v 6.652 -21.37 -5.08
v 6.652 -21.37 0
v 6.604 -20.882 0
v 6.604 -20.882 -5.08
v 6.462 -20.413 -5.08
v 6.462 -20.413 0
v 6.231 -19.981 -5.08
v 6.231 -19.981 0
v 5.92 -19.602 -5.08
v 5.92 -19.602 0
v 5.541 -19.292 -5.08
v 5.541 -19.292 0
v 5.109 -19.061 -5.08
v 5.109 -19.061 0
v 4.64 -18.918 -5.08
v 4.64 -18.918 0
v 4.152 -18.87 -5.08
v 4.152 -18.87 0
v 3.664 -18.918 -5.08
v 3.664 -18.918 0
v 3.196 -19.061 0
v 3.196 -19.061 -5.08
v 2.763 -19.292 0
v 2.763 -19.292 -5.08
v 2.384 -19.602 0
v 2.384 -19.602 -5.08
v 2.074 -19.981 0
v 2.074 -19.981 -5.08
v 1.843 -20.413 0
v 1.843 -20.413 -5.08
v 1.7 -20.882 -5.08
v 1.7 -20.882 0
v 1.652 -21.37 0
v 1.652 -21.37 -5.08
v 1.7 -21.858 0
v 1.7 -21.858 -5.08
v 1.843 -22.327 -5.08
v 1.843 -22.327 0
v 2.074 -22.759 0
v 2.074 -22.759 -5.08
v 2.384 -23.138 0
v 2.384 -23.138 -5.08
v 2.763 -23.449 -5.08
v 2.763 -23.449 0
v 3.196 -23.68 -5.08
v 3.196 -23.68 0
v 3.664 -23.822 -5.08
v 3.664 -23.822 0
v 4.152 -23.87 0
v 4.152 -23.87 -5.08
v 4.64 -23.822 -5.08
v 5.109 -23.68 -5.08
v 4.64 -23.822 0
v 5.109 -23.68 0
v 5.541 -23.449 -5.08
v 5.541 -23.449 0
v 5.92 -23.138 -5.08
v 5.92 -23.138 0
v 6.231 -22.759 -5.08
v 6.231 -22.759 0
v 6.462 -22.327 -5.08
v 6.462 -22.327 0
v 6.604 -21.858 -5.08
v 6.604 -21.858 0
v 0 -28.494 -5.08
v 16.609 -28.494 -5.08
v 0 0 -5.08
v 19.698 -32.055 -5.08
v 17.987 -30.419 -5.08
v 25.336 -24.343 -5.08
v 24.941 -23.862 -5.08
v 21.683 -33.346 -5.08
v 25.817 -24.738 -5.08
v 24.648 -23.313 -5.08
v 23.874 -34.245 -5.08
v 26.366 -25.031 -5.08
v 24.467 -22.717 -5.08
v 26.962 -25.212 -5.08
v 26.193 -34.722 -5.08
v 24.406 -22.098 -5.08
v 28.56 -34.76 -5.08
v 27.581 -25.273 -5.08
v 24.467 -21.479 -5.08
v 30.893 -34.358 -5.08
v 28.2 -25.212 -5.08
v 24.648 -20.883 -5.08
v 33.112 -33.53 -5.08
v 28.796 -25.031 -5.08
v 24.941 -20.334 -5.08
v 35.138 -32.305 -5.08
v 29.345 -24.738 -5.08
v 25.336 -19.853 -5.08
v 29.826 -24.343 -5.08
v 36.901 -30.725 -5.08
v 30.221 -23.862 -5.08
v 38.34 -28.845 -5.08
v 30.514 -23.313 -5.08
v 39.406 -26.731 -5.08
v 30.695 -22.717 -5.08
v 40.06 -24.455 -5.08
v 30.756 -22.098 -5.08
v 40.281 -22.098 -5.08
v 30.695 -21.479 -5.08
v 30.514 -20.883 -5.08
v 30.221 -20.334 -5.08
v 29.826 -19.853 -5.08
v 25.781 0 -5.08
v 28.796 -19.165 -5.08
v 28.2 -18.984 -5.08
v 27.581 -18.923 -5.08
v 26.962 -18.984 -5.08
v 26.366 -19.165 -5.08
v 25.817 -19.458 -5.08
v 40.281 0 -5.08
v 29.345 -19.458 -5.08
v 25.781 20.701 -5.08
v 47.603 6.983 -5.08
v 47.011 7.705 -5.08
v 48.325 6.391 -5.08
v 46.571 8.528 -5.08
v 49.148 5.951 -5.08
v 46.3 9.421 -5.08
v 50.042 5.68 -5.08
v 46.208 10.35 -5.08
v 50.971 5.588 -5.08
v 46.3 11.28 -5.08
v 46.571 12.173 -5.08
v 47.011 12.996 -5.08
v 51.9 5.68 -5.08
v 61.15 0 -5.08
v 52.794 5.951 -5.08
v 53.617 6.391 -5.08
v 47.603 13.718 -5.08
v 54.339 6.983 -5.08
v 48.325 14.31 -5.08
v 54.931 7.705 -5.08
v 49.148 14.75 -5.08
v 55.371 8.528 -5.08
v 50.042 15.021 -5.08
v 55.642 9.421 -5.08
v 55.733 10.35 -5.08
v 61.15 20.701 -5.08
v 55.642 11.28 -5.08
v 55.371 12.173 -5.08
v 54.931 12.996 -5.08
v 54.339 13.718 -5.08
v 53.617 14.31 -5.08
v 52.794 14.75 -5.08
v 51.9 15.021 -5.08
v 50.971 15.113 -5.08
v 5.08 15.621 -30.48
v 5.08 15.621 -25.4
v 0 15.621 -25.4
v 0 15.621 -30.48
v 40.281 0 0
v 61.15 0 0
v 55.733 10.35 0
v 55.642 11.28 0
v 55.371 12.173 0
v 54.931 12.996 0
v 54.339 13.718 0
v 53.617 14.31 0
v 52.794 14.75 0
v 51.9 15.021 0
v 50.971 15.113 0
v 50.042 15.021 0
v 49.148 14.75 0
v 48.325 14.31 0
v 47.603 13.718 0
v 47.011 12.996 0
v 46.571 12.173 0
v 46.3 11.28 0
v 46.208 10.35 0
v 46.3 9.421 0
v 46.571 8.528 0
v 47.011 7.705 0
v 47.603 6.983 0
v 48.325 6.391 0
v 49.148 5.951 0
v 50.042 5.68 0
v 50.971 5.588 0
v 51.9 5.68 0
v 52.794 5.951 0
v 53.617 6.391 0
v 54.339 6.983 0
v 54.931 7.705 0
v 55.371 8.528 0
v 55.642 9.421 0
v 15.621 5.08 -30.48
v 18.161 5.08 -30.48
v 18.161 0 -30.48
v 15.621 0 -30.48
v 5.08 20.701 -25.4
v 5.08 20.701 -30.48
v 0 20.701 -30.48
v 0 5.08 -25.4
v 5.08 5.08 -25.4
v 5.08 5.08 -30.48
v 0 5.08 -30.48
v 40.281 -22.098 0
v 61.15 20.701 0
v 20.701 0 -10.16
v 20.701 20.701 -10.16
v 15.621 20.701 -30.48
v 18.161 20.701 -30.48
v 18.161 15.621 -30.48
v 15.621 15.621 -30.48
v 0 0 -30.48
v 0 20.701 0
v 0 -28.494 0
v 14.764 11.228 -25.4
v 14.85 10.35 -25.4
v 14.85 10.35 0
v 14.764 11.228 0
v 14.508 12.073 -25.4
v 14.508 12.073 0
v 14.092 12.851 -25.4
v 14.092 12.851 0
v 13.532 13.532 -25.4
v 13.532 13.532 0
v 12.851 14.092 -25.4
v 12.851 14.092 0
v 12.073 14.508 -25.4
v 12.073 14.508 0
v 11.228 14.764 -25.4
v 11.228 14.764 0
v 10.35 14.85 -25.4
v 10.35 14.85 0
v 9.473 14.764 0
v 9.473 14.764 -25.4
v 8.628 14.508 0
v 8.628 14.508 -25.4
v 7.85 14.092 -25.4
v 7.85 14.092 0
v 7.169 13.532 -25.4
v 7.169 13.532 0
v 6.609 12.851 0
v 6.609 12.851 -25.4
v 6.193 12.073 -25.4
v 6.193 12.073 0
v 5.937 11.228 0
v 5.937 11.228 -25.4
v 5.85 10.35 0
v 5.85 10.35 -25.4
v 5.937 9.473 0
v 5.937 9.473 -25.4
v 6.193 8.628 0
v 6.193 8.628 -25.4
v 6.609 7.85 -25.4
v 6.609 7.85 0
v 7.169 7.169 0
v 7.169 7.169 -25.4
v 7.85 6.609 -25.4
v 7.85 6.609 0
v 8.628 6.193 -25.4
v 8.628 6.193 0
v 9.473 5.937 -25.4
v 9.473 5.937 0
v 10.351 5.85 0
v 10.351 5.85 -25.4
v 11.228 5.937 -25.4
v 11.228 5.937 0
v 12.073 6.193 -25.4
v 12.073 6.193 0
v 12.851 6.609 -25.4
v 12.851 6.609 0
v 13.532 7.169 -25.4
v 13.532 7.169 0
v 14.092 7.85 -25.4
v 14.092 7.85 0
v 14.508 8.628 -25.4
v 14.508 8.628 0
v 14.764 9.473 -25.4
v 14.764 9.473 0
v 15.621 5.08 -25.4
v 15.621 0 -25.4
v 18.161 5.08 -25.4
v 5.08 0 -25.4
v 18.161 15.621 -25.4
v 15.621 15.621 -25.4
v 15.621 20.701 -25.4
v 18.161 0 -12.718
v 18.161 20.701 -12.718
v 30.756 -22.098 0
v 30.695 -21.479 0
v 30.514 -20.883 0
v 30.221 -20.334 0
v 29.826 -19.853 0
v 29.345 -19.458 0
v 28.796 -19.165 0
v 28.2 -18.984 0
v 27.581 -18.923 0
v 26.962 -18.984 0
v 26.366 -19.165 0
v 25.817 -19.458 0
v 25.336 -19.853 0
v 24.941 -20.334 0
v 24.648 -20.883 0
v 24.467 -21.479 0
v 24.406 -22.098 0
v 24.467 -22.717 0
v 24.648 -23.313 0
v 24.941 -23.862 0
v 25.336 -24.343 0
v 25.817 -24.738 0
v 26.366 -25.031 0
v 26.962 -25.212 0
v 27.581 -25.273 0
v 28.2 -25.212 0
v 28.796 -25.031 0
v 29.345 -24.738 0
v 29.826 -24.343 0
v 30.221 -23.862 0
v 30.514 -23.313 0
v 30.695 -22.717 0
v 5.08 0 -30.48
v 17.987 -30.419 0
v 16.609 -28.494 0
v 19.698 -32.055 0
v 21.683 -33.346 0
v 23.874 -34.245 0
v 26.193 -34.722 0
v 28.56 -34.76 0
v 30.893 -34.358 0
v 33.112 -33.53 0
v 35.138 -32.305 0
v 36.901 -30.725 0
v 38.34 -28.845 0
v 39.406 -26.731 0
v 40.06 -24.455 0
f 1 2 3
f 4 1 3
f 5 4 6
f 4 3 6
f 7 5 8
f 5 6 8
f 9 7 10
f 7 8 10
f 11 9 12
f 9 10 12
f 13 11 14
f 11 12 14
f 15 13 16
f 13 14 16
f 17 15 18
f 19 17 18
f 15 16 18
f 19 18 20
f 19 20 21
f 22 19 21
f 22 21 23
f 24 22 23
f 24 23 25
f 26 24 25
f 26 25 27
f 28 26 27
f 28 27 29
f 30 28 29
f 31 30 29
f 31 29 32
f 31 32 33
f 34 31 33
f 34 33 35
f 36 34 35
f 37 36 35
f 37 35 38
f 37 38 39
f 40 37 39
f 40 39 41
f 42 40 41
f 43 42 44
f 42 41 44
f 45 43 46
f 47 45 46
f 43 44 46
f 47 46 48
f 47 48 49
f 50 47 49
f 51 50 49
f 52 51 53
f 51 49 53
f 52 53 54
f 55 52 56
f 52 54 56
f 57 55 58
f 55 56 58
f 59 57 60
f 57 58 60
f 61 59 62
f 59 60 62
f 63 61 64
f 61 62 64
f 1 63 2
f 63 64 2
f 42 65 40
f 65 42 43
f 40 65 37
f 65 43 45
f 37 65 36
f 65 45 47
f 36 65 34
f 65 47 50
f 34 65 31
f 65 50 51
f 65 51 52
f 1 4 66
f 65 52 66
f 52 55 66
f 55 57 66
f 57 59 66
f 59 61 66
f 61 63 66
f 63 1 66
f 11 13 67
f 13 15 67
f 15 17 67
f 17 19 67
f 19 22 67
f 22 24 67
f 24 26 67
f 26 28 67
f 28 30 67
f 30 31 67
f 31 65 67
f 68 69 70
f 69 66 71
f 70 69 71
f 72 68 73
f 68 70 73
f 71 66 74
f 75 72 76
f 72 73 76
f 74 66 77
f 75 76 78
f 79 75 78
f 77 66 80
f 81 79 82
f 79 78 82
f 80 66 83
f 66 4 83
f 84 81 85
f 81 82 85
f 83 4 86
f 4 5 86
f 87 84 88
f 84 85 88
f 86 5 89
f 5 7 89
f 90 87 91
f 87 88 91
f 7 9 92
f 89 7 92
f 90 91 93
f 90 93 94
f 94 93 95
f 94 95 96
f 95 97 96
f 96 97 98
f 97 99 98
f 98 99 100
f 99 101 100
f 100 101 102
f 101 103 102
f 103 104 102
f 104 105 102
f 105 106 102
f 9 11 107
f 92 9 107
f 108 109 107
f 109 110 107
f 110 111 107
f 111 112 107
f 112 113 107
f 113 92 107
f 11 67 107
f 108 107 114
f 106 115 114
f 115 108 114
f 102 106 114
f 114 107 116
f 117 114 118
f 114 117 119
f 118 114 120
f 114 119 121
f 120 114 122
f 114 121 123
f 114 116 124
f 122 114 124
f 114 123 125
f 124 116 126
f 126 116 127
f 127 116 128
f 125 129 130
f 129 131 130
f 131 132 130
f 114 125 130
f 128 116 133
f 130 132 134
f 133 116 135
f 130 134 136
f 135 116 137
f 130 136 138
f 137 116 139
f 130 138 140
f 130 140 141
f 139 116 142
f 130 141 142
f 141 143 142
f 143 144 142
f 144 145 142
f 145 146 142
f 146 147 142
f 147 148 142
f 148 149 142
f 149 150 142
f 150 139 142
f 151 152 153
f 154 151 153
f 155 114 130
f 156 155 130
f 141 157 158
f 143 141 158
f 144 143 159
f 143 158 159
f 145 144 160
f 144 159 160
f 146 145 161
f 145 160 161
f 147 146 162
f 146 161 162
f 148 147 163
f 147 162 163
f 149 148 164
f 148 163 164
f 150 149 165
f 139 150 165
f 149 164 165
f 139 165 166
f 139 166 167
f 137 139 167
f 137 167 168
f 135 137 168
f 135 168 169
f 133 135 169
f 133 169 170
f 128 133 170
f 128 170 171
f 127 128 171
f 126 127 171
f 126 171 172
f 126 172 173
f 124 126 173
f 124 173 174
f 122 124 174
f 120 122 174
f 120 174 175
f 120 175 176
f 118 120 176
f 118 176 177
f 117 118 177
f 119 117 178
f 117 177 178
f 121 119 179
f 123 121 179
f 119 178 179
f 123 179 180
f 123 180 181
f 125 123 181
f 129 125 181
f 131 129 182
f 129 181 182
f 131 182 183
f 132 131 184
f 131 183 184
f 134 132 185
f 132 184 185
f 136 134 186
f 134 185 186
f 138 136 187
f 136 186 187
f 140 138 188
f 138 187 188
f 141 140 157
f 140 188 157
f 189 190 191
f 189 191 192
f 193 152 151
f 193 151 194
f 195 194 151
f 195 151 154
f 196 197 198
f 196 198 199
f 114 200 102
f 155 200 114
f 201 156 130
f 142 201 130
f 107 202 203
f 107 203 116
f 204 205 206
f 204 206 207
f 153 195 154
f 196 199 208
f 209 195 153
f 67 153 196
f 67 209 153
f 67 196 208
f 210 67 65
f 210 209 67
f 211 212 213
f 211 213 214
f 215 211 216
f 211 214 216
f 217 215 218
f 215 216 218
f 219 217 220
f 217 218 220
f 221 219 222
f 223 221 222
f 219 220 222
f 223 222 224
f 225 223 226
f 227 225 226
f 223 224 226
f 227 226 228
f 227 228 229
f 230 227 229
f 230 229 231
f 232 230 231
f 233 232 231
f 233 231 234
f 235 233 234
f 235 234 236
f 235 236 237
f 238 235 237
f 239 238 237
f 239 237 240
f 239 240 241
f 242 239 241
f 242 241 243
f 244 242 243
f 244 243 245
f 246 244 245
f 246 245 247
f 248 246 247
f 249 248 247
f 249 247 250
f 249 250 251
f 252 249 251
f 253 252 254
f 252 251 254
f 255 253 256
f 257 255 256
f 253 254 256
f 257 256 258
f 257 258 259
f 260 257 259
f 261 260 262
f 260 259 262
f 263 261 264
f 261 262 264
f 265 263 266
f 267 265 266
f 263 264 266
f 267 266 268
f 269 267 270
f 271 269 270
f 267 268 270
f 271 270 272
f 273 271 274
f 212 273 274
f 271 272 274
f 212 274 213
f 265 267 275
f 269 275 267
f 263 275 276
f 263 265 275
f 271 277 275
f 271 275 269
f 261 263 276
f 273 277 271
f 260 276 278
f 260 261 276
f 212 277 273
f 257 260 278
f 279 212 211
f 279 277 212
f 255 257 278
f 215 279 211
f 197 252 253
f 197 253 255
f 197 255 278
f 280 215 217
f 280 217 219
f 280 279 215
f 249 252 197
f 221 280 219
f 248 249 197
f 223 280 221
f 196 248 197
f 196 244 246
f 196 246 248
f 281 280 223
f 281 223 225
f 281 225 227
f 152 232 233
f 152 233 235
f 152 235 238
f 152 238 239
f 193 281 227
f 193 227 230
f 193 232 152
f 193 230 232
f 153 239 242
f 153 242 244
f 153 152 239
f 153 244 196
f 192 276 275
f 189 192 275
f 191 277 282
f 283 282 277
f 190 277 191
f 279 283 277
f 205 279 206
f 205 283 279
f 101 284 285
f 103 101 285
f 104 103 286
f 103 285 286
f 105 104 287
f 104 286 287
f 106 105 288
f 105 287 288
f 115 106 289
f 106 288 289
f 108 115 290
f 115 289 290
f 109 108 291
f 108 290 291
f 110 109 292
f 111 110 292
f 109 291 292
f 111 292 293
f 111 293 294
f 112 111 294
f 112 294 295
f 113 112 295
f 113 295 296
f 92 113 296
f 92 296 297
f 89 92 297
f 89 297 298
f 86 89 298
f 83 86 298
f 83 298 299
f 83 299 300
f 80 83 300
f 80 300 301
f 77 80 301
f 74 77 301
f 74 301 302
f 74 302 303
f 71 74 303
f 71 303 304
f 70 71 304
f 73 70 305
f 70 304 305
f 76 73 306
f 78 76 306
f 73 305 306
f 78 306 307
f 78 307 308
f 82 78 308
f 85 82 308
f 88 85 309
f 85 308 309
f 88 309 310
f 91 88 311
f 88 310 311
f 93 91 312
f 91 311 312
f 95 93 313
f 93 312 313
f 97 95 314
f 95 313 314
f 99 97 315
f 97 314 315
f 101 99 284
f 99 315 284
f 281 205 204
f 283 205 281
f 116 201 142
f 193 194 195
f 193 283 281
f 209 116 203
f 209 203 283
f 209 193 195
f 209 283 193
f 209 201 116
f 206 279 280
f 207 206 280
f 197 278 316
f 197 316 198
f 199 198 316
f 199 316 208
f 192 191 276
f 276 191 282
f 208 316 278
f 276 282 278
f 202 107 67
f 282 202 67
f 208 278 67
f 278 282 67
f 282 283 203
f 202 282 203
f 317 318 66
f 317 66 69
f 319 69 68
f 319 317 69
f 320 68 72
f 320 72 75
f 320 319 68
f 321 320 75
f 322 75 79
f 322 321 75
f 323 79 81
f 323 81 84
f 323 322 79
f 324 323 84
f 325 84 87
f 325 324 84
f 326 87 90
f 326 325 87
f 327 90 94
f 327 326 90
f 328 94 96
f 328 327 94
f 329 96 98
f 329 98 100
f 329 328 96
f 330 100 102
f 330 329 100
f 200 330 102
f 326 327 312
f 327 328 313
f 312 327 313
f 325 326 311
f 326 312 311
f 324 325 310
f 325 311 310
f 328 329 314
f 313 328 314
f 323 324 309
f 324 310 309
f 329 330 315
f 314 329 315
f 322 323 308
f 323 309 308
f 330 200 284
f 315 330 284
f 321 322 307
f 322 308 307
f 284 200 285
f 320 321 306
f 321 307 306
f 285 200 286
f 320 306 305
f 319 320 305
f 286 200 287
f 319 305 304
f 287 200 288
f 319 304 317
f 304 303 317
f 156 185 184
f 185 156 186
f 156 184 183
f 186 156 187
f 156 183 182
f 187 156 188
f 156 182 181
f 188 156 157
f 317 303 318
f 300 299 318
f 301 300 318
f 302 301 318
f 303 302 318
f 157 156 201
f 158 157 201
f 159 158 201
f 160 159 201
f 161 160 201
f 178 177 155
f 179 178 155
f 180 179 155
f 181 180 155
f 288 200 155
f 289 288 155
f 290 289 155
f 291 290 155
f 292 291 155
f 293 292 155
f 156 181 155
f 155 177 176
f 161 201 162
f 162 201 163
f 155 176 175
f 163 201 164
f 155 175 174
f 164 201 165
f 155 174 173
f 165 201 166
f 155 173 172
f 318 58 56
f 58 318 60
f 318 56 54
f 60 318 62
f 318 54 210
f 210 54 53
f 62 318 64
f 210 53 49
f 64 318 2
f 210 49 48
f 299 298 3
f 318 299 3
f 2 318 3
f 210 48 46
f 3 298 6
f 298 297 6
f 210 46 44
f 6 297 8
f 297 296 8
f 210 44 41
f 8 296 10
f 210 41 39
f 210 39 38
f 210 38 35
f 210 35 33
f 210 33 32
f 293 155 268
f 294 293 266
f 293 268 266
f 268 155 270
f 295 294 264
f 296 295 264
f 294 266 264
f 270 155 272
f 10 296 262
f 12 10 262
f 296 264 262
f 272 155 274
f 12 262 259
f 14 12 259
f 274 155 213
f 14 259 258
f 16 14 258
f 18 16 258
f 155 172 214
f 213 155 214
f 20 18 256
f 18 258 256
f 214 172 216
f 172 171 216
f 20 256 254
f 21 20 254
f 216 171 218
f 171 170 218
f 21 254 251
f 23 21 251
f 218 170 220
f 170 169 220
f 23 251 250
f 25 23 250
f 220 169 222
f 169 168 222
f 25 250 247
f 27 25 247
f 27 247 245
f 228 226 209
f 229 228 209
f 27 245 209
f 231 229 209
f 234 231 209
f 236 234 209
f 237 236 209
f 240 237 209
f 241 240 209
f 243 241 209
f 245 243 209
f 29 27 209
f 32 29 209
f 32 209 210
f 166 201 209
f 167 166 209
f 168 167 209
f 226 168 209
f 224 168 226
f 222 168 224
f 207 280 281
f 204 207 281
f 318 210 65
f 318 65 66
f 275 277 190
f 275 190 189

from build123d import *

# Parameters (mm, degrees)
BOSS_EXTRUDE1_DEPTH  = 20.701
SKETCH2_R            = 1
CUT_EXTRUDE1_DEPTH   = 93.545558787
SKETCH3_R            = 1
CUT_EXTRUDE2_DEPTH   = 12.7
SKETCH4_R            = 1
BOSS_EXTRUDE3_DEPTH  = 5.08
SKETCH5_W            = 5.08
SKETCH5_H            = 5.08
BOSS_EXTRUDE4_DEPTH  = 5.08
SKETCH6_W            = 5.08
SKETCH6_H            = 5.08
BOSS_EXTRUDE5_DEPTH  = 5.08
SKETCH7_W            = 2.54
SKETCH7_H            = 15
CUT_EXTRUDE3_DEPTH   = 108.238791728
SKETCH8_W            = 25.4
SKETCH8_H            = 32.87751569
CUT_EXTRUDE4_DEPTH   = 99.137252123
BOSS_EXTRUDE6_DEPTH  = 5.08
BOSS_EXTRUDE9_START  = -5.08
SKETCH12_R           = 1
BOSS_EXTRUDE9_DEPTH  = 5.08
SKETCH13_R           = 1
BOSS_EXTRUDE10_DEPTH = 24.4
CUT_EXTRUDE5_DEPTH   = 30
SKETCH11_R           = 4.5
CUT_EXTRUDE6_DEPTH   = 40
SKETCH16_R           = 3.175
SKETCH16_R_2         = 4.7625
SKETCH16_R_3         = 2.5
CUT_EXTRUDE7_DEPTH   = 40


with BuildPart() as part:
    # Sketch1 → Boss-Extrude1 (new body)
    with BuildSketch(Plane(origin=(0, 0, 0), x_dir=(1, 0, 0), z_dir=(0, 1, 0))):
        Polygon((86.5505, 0), (86.5505, 25.4), (81.4705, 25.4), (81.4705, 10.16), (76.3905, 5.08), (81.4705, 5.08), (81.4705, 0), align=None)
        Polygon((20.701, 10.16), (20.701, 25.4), (0, 25.4), (0, 0), (81.4705, 0), (81.4705, 5.08), (76.3905, 5.08), (25.781, 5.08), (20.701, 5.08), align=None)
        Polygon((20.701, 10.16), (25.781, 5.08), (20.701, 5.08), align=None)
    extrude(amount=BOSS_EXTRUDE1_DEPTH)

    # Sketch2 → Cut-Extrude1 (cut, through all)
    with BuildSketch(Plane(origin=(0, 0, -25.4), x_dir=(-1, 0, 0), z_dir=(0, 0, -1))):
        with Locations((-10.3505, 10.3505)):
            Circle(SKETCH2_R)
    extrude(amount=-CUT_EXTRUDE1_DEPTH, mode=Mode.SUBTRACT)

    # Sketch3 → Cut-Extrude2 (cut)
    with BuildSketch(Plane.XY):
        with Locations((50.970999912, 10.3505)):
            Circle(SKETCH3_R)
    extrude(amount=-CUT_EXTRUDE2_DEPTH, mode=Mode.SUBTRACT)

    # Sketch4 → Boss-Extrude3 (add)
    with BuildSketch(Plane.XY):
        with BuildLine():
            Line((40.280941282, 0), (27.580941282, 0))
            Line((27.580941282, 0), (25.4, 0))
            Line((25.4, 0), (0, 0))
            Line((0, 0), (16.608872552, -28.493600659))
            ThreePointArc((16.608872552, -28.493600659), (30.893397103, -34.358409309), (40.280941282, -22.098))
            Line((40.280941282, -22.098), (40.280941282, 0))
        make_face()
        with Locations((20.138741282, -22.098)):
            Circle(SKETCH4_R, mode=Mode.SUBTRACT)
        with BuildLine():
            ThreePointArc((26.580941282, -22.098), (26.873834501, -21.390893219), (27.580941282, -21.098))
            ThreePointArc((27.580941282, -21.098), (28.288048063, -21.390893219), (28.580941282, -22.098))
            ThreePointArc((28.580941282, -22.098), (27.580941282, -23.098), (26.580941282, -22.098))
        make_face(mode=Mode.SUBTRACT)
        with BuildLine():
            ThreePointArc((36.023141282, -22.098), (35.023141282, -23.098), (34.023141282, -22.098))
            ThreePointArc((34.023141282, -22.098), (35.023141282, -21.098), (36.023141282, -22.098))
        make_face(mode=Mode.SUBTRACT)
    extrude(amount=-BOSS_EXTRUDE3_DEPTH)

    # Sketch5 → Boss-Extrude4 (add)
    with BuildSketch(Plane(origin=(0, 0, -25.4), x_dir=(-1, 0, 0), z_dir=(0, 0, -1))):
        with Locations((-2.54, 2.54)):
            Rectangle(SKETCH5_W, SKETCH5_H)
        with Locations((-2.54, 18.161)):
            Rectangle(SKETCH5_W, SKETCH5_H)
        with Locations((-18.161, 18.161)):
            Rectangle(SKETCH5_W, SKETCH5_H)
        with Locations((-18.161, 2.54)):
            Rectangle(SKETCH5_W, SKETCH5_H)
    extrude(amount=BOSS_EXTRUDE4_DEPTH)

    # Sketch6 → Boss-Extrude5 (add)
    with BuildSketch(Plane(origin=(0, 0, -25.4), x_dir=(-1, 0, 0), z_dir=(0, 0, -1))):
        with Locations((-84.0105, 18.161)):
            Rectangle(SKETCH6_W, SKETCH6_H)
        with Locations((-84.0105, 2.54)):
            Rectangle(SKETCH6_W, SKETCH6_H)
    extrude(amount=BOSS_EXTRUDE5_DEPTH)

    # Sketch7 → Cut-Extrude3 (cut, through all)
    with BuildSketch(Plane(origin=(0, 20.701, 0), x_dir=(1, 0, 0), z_dir=(0, 1, 0))):
        with Locations((82.7405, 22.98)):
            Rectangle(SKETCH7_W, SKETCH7_H)
        with Locations((19.431, 22.98)):
            Rectangle(SKETCH7_W, SKETCH7_H)
    extrude(amount=-CUT_EXTRUDE3_DEPTH, mode=Mode.SUBTRACT)

    # Sketch8 → Cut-Extrude4 (cut, through all)
    with BuildSketch(Plane(origin=(0, 0, 0), x_dir=(-1, 0, 0), z_dir=(0, -1, 0))):
        with Locations((-73.8505, 16.438757845)):
            Rectangle(SKETCH8_W, SKETCH8_H)
    extrude(amount=-CUT_EXTRUDE4_DEPTH, mode=Mode.SUBTRACT)

    # Sketch9 → Boss-Extrude6 (add)
    with BuildSketch(Plane.XY):
        with BuildLine():
            Line((8.304436276, -28.493600659), (16.608872552, -28.493600659))
            Line((16.608872552, -28.493600659), (0, 0))
            Line((0, 0), (0, -14.24680033))
            Line((0, -14.24680033), (3.648627535, -20.506258075))
            ThreePointArc((3.648627535, -20.506258075), (4.650419602, -20.503139192), (5.152218138, -21.370200495))
            ThreePointArc((5.152218138, -21.370200495), (5.01927944, -21.868401958), (4.655808741, -22.234142914))
            Line((4.655808741, -22.234142914), (8.304436276, -28.493600659))
        make_face()
        with BuildLine():
            Line((0, -28.493600659), (8.304436276, -28.493600659))
            Line((8.304436276, -28.493600659), (4.655808741, -22.234142914))
            ThreePointArc((4.655808741, -22.234142914), (3.288275718, -21.873791098), (3.648627535, -20.506258075))
            Line((3.648627535, -20.506258075), (0, -14.24680033))
            Line((0, -14.24680033), (0, -28.493600659))
        make_face()
    extrude(amount=-BOSS_EXTRUDE6_DEPTH)

    # Sketch12 → Boss-Extrude9 (add)
    with BuildSketch(Plane(origin=(0, 0, -5.08), x_dir=(-1, 0, 0), z_dir=(0, 0, -1)).offset(BOSS_EXTRUDE9_START)):
        with Locations((-4.152218138, -21.370200495)):
            Circle(SKETCH12_R)
        with Locations((-20.138741282, -22.098)):
            Circle(SKETCH12_R)
        with Locations((-27.580941282, -22.098)):
            Circle(SKETCH12_R)
        with Locations((-35.023141282, -22.098)):
            Circle(SKETCH12_R)
        with Locations((-50.970999912, 10.3505)):
            Circle(SKETCH12_R)
    extrude(amount=BOSS_EXTRUDE9_DEPTH)

    # Sketch13 → Boss-Extrude10 (add)
    with BuildSketch(Plane(origin=(0, 0, -25.4), x_dir=(-1, 0, 0), z_dir=(0, 0, -1))):
        with Locations((-10.3505, 10.3505)):
            Circle(SKETCH13_R)
    extrude(amount=-BOSS_EXTRUDE10_DEPTH)

    # Sketch15 → Cut-Extrude5 (cut)
    with BuildSketch(Plane(origin=(0, 20.701, 0), x_dir=(1, 0, 0), z_dir=(0, 1, 0))):
        Polygon((18.161, 15.48), (18.161, 12.717664049), (20.701, 10.16), (20.701, 15.48), align=None)
    extrude(amount=-CUT_EXTRUDE5_DEPTH, mode=Mode.SUBTRACT)

    # Sketch11 → Cut-Extrude6 (cut)
    with BuildSketch(Plane.XY):
        with Locations((10.3505, 10.3505)):
            Circle(SKETCH11_R)
    extrude(amount=-CUT_EXTRUDE6_DEPTH, mode=Mode.SUBTRACT)

    # Sketch16 → Cut-Extrude7 (cut)
    with BuildSketch(Plane.XY):
        with Locations((27.580941282, -22.098)):
            Circle(SKETCH16_R)
        with Locations((50.970999912, 10.3505)):
            Circle(SKETCH16_R_2)
        with Locations((4.152218138, -21.370200495)):
            Circle(SKETCH16_R_3)
    extrude(amount=-CUT_EXTRUDE7_DEPTH, mode=Mode.SUBTRACT)


solid = part.part
